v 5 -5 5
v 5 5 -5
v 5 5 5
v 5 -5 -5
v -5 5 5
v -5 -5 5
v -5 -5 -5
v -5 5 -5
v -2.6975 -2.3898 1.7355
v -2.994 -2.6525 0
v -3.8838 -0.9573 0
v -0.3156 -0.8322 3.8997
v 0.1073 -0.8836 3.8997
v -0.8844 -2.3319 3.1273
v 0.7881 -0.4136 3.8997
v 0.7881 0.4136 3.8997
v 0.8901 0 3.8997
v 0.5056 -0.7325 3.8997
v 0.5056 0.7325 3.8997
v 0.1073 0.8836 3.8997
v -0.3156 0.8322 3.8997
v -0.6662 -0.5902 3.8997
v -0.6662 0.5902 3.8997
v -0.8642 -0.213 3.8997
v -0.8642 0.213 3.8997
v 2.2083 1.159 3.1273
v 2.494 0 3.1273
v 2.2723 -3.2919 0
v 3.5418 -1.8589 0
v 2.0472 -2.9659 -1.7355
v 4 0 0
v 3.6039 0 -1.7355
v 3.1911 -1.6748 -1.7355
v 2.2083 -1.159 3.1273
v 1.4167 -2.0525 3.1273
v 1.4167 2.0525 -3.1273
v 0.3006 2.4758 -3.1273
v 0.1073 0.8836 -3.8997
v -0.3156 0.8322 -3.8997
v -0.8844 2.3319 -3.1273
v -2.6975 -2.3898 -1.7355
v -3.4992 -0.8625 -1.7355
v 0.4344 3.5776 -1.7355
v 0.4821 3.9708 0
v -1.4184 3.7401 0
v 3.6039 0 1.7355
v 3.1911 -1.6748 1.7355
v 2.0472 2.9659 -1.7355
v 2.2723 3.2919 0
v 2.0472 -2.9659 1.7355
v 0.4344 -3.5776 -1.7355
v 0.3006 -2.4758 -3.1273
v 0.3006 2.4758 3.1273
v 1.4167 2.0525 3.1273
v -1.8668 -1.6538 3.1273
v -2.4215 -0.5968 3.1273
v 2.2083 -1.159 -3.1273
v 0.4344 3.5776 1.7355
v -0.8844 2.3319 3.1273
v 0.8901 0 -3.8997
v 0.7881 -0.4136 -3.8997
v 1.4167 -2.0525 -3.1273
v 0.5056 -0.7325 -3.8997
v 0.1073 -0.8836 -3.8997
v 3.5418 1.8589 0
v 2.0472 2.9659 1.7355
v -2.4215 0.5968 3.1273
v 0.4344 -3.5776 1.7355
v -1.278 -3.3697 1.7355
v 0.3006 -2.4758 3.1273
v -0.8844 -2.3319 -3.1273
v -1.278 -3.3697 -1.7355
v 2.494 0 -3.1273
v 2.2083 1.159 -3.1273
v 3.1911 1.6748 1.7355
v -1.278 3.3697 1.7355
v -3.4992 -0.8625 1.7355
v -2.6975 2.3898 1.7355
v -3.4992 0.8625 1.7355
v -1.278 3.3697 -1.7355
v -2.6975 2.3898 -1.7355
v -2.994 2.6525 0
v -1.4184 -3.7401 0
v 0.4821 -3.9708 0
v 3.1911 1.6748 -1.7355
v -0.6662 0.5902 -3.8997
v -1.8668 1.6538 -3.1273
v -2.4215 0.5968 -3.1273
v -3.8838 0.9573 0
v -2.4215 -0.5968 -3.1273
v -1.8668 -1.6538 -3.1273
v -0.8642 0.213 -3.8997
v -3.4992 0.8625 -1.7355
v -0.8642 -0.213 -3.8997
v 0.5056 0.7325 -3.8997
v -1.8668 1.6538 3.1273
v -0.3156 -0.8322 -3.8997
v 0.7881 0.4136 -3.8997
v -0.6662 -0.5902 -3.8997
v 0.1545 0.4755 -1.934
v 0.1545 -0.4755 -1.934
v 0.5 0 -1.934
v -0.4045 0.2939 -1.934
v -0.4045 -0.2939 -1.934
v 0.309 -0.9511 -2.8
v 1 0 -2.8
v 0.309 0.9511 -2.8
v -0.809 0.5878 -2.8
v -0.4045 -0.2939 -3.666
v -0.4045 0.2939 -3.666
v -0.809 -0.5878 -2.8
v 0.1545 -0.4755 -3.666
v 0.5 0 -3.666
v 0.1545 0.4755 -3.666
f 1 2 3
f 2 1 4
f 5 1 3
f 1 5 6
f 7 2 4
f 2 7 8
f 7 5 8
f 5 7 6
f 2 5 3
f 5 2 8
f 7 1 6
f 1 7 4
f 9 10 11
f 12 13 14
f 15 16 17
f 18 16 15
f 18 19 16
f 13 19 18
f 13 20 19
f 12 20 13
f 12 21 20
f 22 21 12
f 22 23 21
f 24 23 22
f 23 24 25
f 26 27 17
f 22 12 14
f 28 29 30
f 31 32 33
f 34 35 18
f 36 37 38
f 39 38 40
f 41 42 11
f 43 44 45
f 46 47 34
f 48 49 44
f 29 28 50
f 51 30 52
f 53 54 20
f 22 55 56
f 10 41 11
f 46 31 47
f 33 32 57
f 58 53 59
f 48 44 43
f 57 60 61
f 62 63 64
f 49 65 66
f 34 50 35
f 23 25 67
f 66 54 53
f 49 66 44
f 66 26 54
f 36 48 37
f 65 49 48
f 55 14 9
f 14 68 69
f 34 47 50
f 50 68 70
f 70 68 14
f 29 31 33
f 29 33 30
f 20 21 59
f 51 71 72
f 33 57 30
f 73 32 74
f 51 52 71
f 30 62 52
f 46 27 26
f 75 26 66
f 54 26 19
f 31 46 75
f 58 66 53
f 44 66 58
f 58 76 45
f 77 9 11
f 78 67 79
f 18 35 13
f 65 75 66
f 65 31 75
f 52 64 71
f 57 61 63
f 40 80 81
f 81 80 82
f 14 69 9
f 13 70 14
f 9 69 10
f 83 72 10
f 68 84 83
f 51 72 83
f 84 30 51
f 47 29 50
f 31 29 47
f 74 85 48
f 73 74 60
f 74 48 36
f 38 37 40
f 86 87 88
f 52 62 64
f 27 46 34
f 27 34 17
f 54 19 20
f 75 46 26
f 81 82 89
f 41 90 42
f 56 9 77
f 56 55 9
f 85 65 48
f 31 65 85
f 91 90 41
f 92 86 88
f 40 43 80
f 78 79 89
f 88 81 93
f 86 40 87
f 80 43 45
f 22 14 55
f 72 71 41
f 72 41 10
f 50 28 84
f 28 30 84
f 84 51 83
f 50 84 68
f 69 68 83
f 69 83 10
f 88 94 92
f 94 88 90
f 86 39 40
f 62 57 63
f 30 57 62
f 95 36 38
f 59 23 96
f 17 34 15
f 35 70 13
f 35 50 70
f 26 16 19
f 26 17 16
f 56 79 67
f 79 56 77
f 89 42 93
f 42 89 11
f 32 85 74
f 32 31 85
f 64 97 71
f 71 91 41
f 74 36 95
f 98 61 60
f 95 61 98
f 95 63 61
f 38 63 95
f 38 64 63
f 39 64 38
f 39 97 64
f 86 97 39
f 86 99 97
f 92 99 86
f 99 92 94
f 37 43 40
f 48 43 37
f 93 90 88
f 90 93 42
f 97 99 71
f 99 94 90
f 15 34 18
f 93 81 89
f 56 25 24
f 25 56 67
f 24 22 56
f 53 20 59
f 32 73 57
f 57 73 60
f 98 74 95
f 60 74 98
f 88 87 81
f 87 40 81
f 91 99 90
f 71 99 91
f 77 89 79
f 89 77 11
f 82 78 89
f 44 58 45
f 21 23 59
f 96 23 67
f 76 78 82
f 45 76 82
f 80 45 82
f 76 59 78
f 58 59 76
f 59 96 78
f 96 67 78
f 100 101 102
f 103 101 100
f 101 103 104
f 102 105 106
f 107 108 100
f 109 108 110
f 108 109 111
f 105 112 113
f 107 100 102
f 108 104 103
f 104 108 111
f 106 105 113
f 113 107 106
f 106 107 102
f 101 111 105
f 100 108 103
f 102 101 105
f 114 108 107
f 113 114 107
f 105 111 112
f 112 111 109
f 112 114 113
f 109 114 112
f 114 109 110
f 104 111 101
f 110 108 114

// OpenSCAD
difference() {
    cube(10,center=true);
    sphere(4);
}
translate([0,0,-2.8])
sphere(1);
